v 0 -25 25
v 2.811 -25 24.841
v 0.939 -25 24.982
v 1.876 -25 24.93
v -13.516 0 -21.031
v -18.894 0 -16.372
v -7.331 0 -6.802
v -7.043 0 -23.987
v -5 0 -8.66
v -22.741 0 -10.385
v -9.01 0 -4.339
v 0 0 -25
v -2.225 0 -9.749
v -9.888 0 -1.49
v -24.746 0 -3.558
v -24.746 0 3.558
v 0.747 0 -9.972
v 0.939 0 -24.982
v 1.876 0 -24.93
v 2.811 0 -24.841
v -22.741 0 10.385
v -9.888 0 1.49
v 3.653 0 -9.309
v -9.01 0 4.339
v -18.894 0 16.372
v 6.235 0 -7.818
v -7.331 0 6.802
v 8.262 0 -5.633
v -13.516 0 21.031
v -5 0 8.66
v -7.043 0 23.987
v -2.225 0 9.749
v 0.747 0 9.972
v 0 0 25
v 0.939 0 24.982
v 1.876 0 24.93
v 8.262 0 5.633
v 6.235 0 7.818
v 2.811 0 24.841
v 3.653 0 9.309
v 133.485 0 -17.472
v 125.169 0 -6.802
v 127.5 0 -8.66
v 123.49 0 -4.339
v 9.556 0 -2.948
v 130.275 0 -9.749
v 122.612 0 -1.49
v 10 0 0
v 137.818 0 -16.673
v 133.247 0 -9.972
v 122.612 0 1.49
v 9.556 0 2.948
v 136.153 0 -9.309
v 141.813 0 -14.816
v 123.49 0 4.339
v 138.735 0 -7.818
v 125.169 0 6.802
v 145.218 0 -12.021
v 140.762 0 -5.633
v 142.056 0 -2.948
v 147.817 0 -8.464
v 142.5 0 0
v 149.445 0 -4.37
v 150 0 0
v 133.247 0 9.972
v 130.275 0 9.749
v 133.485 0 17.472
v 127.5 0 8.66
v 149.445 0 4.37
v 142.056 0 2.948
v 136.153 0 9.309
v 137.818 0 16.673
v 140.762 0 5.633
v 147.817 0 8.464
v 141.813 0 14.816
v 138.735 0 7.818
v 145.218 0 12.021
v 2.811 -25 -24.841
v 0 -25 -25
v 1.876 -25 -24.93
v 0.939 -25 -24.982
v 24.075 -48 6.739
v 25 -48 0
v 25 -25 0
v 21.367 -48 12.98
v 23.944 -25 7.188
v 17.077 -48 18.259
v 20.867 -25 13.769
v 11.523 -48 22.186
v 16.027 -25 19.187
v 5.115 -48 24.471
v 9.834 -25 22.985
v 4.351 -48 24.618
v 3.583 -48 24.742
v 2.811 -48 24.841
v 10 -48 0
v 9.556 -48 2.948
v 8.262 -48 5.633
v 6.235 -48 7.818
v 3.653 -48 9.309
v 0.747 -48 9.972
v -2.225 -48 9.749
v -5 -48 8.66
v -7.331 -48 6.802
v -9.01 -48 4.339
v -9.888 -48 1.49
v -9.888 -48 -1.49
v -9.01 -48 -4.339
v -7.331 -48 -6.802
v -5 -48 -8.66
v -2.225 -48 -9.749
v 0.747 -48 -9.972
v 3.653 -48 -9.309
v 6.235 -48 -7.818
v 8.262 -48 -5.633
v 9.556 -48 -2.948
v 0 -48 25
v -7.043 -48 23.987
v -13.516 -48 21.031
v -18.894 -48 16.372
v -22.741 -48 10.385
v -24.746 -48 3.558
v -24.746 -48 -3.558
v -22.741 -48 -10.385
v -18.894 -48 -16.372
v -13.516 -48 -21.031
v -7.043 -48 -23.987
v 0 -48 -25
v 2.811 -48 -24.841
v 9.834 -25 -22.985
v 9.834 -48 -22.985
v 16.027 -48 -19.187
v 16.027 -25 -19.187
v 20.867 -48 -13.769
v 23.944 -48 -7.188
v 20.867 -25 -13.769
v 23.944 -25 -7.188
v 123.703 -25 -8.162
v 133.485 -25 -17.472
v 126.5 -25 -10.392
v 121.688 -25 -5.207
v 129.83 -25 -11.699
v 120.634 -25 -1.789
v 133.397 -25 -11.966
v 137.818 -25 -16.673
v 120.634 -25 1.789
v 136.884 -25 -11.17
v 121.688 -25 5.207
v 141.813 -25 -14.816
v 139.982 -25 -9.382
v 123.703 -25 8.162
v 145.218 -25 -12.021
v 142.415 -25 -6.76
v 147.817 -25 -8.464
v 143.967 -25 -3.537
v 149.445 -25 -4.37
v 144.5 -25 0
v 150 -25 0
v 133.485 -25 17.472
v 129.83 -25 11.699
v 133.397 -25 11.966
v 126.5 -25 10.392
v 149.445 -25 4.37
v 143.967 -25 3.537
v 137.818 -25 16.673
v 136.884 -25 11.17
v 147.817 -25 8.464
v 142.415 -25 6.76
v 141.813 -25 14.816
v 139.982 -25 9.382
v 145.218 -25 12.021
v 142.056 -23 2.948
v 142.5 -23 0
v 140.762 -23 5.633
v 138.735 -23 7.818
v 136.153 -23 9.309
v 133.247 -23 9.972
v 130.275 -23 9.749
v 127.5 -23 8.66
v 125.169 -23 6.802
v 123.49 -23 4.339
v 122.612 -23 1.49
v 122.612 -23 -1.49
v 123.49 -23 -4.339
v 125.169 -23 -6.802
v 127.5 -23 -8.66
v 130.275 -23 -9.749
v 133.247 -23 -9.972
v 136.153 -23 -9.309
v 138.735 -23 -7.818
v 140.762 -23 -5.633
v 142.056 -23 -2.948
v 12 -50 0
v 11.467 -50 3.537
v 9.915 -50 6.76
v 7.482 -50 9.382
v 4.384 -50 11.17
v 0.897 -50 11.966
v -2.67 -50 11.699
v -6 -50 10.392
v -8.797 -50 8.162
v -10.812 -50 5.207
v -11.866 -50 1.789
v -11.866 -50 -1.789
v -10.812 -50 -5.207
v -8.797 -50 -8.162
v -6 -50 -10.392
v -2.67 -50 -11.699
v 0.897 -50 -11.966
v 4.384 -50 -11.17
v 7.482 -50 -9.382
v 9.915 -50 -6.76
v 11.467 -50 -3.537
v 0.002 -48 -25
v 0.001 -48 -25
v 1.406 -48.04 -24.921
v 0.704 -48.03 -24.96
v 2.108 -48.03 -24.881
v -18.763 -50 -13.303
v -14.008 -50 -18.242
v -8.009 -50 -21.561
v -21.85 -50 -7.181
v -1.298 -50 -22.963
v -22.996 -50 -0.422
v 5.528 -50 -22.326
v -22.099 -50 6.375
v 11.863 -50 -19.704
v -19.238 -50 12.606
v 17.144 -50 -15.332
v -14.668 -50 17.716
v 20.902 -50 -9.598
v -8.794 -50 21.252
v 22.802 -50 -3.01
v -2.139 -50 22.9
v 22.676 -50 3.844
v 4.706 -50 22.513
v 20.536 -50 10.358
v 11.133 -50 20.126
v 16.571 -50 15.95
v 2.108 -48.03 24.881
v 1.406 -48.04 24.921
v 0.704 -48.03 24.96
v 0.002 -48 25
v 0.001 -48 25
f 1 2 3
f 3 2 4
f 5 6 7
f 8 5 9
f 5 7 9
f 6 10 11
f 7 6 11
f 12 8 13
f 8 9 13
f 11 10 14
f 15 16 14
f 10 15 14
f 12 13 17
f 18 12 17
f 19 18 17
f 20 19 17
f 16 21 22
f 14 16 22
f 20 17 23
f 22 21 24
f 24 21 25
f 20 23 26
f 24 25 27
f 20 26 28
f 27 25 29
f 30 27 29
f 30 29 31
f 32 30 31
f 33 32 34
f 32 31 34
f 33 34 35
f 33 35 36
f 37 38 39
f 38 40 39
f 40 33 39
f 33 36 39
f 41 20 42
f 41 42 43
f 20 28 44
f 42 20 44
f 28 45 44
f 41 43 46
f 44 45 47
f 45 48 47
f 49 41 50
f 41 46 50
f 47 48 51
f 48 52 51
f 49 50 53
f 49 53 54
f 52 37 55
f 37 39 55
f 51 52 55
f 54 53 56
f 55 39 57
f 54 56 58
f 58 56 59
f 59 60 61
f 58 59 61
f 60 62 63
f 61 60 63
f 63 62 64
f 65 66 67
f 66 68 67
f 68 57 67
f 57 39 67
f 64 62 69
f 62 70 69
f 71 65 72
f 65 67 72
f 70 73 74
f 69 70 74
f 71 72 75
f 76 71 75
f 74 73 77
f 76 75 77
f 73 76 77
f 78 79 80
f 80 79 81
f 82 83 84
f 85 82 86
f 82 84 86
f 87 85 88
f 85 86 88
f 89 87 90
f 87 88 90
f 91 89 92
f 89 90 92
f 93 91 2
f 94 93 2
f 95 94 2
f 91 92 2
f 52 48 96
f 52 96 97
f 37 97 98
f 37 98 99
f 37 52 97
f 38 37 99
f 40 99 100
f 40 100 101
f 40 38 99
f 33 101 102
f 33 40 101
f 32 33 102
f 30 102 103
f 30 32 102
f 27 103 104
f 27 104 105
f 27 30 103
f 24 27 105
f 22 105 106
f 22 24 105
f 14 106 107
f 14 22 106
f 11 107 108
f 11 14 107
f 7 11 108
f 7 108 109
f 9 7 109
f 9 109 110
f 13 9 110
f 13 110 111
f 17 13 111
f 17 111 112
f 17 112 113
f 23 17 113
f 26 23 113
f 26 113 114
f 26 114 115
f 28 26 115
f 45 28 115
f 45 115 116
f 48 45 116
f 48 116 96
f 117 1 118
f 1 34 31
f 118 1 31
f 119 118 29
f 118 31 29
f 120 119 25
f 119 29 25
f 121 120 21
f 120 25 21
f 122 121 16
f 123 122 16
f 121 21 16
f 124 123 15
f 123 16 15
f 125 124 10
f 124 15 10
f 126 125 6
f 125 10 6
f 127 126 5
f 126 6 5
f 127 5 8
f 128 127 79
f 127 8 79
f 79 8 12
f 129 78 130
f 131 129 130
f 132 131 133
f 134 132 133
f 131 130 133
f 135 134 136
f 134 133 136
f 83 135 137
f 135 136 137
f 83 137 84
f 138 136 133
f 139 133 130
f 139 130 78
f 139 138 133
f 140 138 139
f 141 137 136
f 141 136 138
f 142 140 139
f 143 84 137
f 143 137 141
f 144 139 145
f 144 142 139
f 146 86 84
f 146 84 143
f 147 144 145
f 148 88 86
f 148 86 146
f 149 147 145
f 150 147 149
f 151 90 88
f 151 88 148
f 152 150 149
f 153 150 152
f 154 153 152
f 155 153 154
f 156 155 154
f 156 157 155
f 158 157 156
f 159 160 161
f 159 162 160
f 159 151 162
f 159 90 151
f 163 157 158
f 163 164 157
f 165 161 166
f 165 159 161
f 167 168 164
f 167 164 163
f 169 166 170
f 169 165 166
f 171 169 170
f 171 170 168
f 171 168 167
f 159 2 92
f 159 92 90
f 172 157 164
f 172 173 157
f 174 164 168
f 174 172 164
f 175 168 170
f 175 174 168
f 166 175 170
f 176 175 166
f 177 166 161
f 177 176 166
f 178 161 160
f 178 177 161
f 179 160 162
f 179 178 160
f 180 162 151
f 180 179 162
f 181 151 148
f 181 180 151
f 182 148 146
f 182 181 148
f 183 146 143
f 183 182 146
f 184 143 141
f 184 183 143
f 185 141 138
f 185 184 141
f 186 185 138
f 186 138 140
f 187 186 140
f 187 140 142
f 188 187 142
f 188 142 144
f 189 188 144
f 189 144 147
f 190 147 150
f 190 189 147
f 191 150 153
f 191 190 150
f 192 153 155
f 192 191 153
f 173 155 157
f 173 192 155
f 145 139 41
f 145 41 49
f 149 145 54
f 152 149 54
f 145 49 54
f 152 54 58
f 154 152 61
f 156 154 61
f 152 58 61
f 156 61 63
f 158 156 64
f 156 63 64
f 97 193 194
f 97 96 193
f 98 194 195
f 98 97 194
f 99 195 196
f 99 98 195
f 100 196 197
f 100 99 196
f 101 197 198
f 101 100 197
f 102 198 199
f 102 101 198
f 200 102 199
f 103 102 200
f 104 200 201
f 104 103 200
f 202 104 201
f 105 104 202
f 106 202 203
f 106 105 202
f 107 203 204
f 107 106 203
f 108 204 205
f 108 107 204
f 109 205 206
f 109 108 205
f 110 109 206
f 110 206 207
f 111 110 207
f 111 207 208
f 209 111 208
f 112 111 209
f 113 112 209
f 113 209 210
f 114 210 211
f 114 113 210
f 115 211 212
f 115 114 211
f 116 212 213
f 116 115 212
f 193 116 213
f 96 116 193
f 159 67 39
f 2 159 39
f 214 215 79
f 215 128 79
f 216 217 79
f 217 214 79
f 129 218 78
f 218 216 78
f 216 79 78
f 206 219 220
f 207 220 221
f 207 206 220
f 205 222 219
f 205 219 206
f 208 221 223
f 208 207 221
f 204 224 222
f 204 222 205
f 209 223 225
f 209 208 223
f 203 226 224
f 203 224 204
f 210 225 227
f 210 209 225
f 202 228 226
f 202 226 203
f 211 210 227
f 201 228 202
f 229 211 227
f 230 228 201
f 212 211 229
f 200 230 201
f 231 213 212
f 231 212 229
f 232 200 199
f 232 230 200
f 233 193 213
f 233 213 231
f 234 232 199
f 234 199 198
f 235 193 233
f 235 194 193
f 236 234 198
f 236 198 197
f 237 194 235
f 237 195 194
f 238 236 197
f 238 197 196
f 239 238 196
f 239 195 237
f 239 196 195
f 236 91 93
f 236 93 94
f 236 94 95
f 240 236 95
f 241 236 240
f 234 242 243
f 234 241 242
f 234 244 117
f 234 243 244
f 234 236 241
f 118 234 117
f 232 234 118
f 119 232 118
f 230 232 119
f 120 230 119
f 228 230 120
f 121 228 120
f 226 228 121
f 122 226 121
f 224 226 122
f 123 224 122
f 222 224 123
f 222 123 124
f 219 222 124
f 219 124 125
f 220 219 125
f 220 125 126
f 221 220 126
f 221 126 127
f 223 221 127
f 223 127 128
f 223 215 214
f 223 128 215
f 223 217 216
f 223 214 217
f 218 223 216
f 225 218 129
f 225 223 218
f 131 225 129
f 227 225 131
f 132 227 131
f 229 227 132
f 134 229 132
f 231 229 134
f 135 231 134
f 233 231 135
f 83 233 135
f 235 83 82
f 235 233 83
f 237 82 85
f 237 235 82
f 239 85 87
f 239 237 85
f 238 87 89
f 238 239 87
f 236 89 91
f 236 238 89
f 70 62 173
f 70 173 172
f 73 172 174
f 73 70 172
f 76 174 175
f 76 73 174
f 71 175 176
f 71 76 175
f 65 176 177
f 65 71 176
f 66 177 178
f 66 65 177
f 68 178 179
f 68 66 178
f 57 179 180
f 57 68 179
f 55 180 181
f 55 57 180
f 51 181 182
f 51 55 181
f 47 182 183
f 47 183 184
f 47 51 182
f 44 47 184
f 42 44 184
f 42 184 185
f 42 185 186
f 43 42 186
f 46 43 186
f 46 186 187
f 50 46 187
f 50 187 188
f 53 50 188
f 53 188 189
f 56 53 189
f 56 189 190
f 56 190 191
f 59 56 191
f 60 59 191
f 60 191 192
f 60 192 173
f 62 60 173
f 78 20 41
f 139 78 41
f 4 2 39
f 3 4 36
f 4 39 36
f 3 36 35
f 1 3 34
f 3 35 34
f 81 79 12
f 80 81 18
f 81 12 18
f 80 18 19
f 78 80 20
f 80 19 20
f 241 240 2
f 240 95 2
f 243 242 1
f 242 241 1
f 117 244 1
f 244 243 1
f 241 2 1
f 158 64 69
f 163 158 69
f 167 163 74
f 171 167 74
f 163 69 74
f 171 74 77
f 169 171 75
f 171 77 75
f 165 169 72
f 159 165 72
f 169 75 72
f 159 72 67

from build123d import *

# Parameters (mm, degrees)
F0_R        = 10
F1_DEPTH    = 25
F2_DEPTH    = 50
F3_T4_ANGLE = 203.6133668192
F3_T6_ANGLE = 179.9906971182


# Not quite as in the source:
# - a fillet or chamfer that OpenCascade refuses, or shapes differently, is made with other operations: its cross-section is extruded or revolved along the edge and cut away or added


with BuildPart() as f1:
    # F0 (on Front) → F1 (new body)
    with BuildSketch(Plane.XZ):
        with BuildLine():
            Line((2.8107571296, 24.8414903812), (0, 25))
            ThreePointArc((0, 25), (-25, 0), (0, -25))
            Line((0, -25), (2.8107571296, -24.8414903812))
            ThreePointArc((2.8107571296, -24.8414903812), (18.6449581421, -16.6542948179), (25, 0))
            ThreePointArc((25, 0), (18.6449581421, 16.6542948179), (2.8107571296, 24.8414903812))
        make_face()
        Circle(F0_R, mode=Mode.SUBTRACT)
        with BuildLine():
            ThreePointArc((2.8107571296, 24.8414903812), (1.4076115356, 24.9603411388), (0, 25))
            Line((0, 25), (2.8107571296, 24.8414903812))
        make_face()
        with BuildLine():
            Line((2.8107571296, -24.8414903812), (0, -25))
            ThreePointArc((0, -25), (1.4076115356, -24.9603411388), (2.8107571296, -24.8414903812))
        make_face()
        with BuildLine():
            Line((133.4853280749, 17.4722387972), (2.8107571296, 24.8414903812))
            ThreePointArc((2.8107571296, 24.8414903812), (18.6449581421, 16.6542948179), (25, 0))
            ThreePointArc((25, 0), (18.6449581421, -16.6542948179), (2.8107571296, -24.8414903812))
            Line((2.8107571296, -24.8414903812), (133.4853280749, -17.4722387972))
            ThreePointArc((133.4853280749, -17.4722387972), (115, 0), (133.4853280749, 17.4722387972))
        make_face()
        with BuildLine():
            ThreePointArc((150, 0), (145.2179644855, 12.0209558415), (133.4853280749, 17.4722387972))
            ThreePointArc((133.4853280749, 17.4722387972), (115, 0), (133.4853280749, -17.4722387972))
            ThreePointArc((133.4853280749, -17.4722387972), (145.2179644855, -12.0209558415), (150, 0))
        make_face()
        with Locations((132.5, 0)):
            Circle(F0_R, mode=Mode.SUBTRACT)
    extrude(amount=F1_DEPTH)

    # F0 (on Front) → F2 (join)
    with BuildSketch(Plane.XZ):
        with BuildLine():
            Line((2.8107571296, 24.8414903812), (0, 25))
            ThreePointArc((0, 25), (-25, 0), (0, -25))
            Line((0, -25), (2.8107571296, -24.8414903812))
            ThreePointArc((2.8107571296, -24.8414903812), (18.6449581421, -16.6542948179), (25, 0))
            ThreePointArc((25, 0), (18.6449581421, 16.6542948179), (2.8107571296, 24.8414903812))
        make_face()
        Circle(F0_R, mode=Mode.SUBTRACT)
    extrude(amount=F2_DEPTH)

    # F3: chamfer of 2 on 4 edges, made by hand

    # F3_s1 → F3_t2 (revolve, cut)
    with BuildSketch(Plane.XY):
        Polygon((12, -50), (10, -48), (10, -50), align=None)
    revolve(axis=Axis((0, -50, 0), (0, -1, 0)), mode=Mode.SUBTRACT)

    # F3_s3 → F3_t4 (revolve, cut)
    with BuildSketch(Plane(origin=(0, 0, 0), x_dir=(0, 1, 0), z_dir=(0.9788435281, 0, -0.2046102329))):
        Polygon((-48, 25), (-50, 23), (-50, 25), align=None)
    revolve(axis=Axis((0, -50, 0), (0, -1, 0)), revolution_arc=F3_T4_ANGLE, mode=Mode.SUBTRACT)

    # F3_s5 → F3_t6 (revolve, cut)
    with BuildSketch(Plane(origin=(0, 0, 0), x_dir=(0, 1, 0), z_dir=(-0.9999999967, 0, 8.1183e-05))):
        Polygon((-48, -25), (-50, -23), (-50, -25), align=None)
    revolve(axis=Axis((0, -50, 0), (0, 1, 0)), revolution_arc=F3_T6_ANGLE, mode=Mode.SUBTRACT)

    # F3_s7 → F3_t8 (revolve, cut)
    with BuildSketch(Plane.XY):
        Polygon((144.5, -25), (142.5, -23), (142.5, -25), align=None)
    revolve(axis=Axis((132.5, -25, 0), (0, -1, 0)), mode=Mode.SUBTRACT)


solid = f1.part
